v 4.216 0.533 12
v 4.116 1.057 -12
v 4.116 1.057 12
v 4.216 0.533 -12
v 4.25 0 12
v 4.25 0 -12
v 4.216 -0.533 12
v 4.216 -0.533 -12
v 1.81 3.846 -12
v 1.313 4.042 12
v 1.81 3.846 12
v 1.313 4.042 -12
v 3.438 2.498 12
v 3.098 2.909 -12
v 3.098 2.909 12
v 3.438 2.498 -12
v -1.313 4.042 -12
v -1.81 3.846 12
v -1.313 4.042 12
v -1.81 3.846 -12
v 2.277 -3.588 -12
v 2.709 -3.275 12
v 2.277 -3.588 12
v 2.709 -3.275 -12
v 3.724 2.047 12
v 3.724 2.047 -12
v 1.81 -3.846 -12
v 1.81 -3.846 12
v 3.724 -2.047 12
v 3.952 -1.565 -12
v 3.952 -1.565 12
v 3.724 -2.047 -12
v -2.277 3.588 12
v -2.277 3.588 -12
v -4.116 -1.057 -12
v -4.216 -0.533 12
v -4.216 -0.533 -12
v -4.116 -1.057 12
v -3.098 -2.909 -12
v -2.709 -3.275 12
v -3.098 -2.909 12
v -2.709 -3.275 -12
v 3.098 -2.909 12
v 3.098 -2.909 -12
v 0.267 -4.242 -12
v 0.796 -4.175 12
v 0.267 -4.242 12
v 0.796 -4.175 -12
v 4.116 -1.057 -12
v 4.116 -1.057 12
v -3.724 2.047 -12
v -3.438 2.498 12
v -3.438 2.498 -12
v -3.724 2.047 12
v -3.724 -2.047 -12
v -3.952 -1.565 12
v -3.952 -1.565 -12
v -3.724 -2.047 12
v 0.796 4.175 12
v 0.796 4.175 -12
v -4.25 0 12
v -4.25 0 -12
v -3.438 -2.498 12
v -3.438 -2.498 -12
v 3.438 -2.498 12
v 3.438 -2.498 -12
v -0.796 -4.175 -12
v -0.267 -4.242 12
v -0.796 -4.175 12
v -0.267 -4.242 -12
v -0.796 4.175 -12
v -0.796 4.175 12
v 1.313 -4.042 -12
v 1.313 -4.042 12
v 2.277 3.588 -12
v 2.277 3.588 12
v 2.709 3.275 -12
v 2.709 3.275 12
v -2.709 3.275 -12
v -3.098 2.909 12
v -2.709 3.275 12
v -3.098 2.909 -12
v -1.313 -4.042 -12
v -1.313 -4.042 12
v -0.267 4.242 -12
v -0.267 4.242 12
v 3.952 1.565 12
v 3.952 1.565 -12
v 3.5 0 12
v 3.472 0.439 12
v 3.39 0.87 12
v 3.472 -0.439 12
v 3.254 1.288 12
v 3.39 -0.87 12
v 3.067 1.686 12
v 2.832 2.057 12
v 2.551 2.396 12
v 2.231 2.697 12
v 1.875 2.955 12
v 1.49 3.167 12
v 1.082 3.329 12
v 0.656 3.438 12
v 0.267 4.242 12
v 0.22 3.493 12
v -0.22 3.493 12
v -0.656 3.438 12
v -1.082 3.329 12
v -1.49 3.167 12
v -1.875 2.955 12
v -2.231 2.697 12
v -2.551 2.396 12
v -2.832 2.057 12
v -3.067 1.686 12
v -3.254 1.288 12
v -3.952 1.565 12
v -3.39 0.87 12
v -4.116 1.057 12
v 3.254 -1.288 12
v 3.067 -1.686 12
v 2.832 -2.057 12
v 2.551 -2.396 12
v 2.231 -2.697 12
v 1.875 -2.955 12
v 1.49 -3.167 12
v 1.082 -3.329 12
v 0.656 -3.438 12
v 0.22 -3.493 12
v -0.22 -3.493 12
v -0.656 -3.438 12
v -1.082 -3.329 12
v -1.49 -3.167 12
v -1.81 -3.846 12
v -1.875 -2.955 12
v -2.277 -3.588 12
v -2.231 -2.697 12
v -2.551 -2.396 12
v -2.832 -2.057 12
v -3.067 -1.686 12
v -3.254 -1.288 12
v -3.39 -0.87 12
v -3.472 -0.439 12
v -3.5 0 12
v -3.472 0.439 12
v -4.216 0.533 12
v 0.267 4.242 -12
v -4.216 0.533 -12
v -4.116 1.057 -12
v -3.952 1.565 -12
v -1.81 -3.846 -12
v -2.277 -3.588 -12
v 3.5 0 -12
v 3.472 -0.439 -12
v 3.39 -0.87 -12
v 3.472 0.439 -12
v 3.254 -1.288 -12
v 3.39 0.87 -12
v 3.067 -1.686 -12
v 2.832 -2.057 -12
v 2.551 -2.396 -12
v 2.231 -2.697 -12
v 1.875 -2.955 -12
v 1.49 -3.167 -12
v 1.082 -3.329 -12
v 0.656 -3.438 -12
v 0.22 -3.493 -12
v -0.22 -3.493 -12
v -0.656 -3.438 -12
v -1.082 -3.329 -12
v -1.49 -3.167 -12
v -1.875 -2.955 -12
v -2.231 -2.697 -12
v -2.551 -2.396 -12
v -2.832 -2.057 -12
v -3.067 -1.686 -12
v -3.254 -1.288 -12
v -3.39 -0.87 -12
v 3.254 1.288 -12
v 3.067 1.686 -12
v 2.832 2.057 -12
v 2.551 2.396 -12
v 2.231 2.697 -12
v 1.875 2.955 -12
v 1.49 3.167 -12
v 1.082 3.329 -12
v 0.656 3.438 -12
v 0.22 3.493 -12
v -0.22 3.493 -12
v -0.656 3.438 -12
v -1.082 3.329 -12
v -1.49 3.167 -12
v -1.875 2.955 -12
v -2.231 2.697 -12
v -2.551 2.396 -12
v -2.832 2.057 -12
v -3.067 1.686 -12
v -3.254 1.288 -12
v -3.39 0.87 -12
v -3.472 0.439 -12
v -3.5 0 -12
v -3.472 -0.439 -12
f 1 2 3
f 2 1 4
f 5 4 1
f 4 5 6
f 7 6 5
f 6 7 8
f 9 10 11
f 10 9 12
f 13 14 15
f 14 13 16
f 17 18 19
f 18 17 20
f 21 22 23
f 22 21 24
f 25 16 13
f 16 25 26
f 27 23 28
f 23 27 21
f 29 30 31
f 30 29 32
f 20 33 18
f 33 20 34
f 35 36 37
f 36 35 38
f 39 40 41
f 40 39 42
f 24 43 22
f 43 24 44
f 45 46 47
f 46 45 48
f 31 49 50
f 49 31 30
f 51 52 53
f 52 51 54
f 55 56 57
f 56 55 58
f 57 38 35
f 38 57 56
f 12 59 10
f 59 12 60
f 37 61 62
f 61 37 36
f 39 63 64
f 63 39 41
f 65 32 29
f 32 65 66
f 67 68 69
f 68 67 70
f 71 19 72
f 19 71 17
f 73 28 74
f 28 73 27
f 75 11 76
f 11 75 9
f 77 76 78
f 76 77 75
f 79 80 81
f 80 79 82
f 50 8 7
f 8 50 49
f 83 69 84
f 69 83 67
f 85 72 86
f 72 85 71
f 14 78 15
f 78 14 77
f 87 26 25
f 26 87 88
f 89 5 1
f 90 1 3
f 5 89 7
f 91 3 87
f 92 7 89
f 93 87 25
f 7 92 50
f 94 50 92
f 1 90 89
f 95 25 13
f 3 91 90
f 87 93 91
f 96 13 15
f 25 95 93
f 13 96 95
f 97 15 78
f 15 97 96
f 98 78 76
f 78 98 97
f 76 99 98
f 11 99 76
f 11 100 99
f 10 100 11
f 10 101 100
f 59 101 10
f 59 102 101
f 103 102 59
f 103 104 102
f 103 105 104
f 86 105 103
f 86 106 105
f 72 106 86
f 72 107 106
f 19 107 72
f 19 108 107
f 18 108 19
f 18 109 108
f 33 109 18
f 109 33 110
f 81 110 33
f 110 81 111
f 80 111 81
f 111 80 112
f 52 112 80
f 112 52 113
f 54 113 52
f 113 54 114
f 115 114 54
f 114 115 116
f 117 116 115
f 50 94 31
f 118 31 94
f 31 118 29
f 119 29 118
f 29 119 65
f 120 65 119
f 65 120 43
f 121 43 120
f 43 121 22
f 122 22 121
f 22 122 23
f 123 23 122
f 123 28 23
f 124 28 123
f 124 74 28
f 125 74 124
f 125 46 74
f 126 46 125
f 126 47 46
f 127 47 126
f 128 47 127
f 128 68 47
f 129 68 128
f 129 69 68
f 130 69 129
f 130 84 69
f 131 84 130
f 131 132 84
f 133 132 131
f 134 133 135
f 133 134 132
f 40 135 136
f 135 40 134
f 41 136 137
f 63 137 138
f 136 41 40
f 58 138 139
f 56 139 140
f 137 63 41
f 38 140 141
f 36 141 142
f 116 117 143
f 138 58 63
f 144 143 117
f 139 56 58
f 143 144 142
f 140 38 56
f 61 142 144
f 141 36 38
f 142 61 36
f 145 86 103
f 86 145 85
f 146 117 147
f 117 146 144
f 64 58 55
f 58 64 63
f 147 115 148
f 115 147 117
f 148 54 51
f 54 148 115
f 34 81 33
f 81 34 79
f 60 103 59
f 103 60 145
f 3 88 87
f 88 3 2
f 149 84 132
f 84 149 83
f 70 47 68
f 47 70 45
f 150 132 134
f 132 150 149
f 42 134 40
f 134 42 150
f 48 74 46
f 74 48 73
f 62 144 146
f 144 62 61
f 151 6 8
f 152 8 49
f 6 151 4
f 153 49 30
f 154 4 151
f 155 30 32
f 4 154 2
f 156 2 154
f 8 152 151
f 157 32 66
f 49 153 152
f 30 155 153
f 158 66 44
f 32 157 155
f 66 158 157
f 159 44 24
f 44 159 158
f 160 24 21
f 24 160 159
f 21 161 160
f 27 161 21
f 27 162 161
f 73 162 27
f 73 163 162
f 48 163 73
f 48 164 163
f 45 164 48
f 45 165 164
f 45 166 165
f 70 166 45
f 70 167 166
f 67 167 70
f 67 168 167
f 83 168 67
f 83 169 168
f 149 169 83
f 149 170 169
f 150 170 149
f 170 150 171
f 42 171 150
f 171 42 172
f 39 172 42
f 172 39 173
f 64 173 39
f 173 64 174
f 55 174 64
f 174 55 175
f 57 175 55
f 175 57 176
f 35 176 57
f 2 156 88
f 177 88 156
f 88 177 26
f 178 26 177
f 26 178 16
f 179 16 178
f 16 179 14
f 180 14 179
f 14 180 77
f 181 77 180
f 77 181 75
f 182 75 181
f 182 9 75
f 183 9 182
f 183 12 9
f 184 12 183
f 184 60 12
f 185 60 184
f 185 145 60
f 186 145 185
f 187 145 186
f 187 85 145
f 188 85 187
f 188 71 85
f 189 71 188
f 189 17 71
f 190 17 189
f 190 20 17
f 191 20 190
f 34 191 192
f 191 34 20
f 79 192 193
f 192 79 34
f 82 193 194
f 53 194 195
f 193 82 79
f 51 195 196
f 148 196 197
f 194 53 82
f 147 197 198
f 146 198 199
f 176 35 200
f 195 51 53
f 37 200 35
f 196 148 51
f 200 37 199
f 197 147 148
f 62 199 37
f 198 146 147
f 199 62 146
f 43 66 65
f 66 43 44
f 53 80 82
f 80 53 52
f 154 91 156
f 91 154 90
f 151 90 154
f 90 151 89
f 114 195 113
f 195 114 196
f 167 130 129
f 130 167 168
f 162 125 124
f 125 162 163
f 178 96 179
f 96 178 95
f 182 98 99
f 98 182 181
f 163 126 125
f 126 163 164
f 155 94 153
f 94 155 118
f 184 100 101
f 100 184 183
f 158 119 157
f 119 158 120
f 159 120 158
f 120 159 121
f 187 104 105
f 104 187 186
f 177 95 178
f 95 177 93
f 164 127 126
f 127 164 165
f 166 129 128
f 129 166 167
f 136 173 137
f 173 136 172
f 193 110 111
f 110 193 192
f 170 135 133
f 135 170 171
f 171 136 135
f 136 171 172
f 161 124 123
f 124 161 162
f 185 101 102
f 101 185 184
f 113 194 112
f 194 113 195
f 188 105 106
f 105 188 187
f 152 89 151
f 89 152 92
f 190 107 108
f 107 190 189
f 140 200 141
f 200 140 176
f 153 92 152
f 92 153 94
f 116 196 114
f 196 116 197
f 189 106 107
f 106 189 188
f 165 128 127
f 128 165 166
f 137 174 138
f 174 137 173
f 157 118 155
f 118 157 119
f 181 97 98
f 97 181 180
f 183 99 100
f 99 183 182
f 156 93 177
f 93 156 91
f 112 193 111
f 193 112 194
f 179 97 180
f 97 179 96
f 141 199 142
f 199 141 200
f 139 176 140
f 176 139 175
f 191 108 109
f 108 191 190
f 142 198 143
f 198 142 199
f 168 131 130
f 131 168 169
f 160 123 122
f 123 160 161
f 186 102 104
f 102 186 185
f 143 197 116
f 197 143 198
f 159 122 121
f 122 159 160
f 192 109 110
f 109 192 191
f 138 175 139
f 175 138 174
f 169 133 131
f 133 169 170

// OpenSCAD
$fn = 50;


difference() {
	union() {
		translate(v = [0, 0, -12.0000000000]) {
			cylinder(h = 24, r = 4.2500000000);
		}
	}
	union() {
		translate(v = [0, 0, -100.0000000000]) {
			cylinder(h = 200, r = 3.5000000000);
		}
	}
}
